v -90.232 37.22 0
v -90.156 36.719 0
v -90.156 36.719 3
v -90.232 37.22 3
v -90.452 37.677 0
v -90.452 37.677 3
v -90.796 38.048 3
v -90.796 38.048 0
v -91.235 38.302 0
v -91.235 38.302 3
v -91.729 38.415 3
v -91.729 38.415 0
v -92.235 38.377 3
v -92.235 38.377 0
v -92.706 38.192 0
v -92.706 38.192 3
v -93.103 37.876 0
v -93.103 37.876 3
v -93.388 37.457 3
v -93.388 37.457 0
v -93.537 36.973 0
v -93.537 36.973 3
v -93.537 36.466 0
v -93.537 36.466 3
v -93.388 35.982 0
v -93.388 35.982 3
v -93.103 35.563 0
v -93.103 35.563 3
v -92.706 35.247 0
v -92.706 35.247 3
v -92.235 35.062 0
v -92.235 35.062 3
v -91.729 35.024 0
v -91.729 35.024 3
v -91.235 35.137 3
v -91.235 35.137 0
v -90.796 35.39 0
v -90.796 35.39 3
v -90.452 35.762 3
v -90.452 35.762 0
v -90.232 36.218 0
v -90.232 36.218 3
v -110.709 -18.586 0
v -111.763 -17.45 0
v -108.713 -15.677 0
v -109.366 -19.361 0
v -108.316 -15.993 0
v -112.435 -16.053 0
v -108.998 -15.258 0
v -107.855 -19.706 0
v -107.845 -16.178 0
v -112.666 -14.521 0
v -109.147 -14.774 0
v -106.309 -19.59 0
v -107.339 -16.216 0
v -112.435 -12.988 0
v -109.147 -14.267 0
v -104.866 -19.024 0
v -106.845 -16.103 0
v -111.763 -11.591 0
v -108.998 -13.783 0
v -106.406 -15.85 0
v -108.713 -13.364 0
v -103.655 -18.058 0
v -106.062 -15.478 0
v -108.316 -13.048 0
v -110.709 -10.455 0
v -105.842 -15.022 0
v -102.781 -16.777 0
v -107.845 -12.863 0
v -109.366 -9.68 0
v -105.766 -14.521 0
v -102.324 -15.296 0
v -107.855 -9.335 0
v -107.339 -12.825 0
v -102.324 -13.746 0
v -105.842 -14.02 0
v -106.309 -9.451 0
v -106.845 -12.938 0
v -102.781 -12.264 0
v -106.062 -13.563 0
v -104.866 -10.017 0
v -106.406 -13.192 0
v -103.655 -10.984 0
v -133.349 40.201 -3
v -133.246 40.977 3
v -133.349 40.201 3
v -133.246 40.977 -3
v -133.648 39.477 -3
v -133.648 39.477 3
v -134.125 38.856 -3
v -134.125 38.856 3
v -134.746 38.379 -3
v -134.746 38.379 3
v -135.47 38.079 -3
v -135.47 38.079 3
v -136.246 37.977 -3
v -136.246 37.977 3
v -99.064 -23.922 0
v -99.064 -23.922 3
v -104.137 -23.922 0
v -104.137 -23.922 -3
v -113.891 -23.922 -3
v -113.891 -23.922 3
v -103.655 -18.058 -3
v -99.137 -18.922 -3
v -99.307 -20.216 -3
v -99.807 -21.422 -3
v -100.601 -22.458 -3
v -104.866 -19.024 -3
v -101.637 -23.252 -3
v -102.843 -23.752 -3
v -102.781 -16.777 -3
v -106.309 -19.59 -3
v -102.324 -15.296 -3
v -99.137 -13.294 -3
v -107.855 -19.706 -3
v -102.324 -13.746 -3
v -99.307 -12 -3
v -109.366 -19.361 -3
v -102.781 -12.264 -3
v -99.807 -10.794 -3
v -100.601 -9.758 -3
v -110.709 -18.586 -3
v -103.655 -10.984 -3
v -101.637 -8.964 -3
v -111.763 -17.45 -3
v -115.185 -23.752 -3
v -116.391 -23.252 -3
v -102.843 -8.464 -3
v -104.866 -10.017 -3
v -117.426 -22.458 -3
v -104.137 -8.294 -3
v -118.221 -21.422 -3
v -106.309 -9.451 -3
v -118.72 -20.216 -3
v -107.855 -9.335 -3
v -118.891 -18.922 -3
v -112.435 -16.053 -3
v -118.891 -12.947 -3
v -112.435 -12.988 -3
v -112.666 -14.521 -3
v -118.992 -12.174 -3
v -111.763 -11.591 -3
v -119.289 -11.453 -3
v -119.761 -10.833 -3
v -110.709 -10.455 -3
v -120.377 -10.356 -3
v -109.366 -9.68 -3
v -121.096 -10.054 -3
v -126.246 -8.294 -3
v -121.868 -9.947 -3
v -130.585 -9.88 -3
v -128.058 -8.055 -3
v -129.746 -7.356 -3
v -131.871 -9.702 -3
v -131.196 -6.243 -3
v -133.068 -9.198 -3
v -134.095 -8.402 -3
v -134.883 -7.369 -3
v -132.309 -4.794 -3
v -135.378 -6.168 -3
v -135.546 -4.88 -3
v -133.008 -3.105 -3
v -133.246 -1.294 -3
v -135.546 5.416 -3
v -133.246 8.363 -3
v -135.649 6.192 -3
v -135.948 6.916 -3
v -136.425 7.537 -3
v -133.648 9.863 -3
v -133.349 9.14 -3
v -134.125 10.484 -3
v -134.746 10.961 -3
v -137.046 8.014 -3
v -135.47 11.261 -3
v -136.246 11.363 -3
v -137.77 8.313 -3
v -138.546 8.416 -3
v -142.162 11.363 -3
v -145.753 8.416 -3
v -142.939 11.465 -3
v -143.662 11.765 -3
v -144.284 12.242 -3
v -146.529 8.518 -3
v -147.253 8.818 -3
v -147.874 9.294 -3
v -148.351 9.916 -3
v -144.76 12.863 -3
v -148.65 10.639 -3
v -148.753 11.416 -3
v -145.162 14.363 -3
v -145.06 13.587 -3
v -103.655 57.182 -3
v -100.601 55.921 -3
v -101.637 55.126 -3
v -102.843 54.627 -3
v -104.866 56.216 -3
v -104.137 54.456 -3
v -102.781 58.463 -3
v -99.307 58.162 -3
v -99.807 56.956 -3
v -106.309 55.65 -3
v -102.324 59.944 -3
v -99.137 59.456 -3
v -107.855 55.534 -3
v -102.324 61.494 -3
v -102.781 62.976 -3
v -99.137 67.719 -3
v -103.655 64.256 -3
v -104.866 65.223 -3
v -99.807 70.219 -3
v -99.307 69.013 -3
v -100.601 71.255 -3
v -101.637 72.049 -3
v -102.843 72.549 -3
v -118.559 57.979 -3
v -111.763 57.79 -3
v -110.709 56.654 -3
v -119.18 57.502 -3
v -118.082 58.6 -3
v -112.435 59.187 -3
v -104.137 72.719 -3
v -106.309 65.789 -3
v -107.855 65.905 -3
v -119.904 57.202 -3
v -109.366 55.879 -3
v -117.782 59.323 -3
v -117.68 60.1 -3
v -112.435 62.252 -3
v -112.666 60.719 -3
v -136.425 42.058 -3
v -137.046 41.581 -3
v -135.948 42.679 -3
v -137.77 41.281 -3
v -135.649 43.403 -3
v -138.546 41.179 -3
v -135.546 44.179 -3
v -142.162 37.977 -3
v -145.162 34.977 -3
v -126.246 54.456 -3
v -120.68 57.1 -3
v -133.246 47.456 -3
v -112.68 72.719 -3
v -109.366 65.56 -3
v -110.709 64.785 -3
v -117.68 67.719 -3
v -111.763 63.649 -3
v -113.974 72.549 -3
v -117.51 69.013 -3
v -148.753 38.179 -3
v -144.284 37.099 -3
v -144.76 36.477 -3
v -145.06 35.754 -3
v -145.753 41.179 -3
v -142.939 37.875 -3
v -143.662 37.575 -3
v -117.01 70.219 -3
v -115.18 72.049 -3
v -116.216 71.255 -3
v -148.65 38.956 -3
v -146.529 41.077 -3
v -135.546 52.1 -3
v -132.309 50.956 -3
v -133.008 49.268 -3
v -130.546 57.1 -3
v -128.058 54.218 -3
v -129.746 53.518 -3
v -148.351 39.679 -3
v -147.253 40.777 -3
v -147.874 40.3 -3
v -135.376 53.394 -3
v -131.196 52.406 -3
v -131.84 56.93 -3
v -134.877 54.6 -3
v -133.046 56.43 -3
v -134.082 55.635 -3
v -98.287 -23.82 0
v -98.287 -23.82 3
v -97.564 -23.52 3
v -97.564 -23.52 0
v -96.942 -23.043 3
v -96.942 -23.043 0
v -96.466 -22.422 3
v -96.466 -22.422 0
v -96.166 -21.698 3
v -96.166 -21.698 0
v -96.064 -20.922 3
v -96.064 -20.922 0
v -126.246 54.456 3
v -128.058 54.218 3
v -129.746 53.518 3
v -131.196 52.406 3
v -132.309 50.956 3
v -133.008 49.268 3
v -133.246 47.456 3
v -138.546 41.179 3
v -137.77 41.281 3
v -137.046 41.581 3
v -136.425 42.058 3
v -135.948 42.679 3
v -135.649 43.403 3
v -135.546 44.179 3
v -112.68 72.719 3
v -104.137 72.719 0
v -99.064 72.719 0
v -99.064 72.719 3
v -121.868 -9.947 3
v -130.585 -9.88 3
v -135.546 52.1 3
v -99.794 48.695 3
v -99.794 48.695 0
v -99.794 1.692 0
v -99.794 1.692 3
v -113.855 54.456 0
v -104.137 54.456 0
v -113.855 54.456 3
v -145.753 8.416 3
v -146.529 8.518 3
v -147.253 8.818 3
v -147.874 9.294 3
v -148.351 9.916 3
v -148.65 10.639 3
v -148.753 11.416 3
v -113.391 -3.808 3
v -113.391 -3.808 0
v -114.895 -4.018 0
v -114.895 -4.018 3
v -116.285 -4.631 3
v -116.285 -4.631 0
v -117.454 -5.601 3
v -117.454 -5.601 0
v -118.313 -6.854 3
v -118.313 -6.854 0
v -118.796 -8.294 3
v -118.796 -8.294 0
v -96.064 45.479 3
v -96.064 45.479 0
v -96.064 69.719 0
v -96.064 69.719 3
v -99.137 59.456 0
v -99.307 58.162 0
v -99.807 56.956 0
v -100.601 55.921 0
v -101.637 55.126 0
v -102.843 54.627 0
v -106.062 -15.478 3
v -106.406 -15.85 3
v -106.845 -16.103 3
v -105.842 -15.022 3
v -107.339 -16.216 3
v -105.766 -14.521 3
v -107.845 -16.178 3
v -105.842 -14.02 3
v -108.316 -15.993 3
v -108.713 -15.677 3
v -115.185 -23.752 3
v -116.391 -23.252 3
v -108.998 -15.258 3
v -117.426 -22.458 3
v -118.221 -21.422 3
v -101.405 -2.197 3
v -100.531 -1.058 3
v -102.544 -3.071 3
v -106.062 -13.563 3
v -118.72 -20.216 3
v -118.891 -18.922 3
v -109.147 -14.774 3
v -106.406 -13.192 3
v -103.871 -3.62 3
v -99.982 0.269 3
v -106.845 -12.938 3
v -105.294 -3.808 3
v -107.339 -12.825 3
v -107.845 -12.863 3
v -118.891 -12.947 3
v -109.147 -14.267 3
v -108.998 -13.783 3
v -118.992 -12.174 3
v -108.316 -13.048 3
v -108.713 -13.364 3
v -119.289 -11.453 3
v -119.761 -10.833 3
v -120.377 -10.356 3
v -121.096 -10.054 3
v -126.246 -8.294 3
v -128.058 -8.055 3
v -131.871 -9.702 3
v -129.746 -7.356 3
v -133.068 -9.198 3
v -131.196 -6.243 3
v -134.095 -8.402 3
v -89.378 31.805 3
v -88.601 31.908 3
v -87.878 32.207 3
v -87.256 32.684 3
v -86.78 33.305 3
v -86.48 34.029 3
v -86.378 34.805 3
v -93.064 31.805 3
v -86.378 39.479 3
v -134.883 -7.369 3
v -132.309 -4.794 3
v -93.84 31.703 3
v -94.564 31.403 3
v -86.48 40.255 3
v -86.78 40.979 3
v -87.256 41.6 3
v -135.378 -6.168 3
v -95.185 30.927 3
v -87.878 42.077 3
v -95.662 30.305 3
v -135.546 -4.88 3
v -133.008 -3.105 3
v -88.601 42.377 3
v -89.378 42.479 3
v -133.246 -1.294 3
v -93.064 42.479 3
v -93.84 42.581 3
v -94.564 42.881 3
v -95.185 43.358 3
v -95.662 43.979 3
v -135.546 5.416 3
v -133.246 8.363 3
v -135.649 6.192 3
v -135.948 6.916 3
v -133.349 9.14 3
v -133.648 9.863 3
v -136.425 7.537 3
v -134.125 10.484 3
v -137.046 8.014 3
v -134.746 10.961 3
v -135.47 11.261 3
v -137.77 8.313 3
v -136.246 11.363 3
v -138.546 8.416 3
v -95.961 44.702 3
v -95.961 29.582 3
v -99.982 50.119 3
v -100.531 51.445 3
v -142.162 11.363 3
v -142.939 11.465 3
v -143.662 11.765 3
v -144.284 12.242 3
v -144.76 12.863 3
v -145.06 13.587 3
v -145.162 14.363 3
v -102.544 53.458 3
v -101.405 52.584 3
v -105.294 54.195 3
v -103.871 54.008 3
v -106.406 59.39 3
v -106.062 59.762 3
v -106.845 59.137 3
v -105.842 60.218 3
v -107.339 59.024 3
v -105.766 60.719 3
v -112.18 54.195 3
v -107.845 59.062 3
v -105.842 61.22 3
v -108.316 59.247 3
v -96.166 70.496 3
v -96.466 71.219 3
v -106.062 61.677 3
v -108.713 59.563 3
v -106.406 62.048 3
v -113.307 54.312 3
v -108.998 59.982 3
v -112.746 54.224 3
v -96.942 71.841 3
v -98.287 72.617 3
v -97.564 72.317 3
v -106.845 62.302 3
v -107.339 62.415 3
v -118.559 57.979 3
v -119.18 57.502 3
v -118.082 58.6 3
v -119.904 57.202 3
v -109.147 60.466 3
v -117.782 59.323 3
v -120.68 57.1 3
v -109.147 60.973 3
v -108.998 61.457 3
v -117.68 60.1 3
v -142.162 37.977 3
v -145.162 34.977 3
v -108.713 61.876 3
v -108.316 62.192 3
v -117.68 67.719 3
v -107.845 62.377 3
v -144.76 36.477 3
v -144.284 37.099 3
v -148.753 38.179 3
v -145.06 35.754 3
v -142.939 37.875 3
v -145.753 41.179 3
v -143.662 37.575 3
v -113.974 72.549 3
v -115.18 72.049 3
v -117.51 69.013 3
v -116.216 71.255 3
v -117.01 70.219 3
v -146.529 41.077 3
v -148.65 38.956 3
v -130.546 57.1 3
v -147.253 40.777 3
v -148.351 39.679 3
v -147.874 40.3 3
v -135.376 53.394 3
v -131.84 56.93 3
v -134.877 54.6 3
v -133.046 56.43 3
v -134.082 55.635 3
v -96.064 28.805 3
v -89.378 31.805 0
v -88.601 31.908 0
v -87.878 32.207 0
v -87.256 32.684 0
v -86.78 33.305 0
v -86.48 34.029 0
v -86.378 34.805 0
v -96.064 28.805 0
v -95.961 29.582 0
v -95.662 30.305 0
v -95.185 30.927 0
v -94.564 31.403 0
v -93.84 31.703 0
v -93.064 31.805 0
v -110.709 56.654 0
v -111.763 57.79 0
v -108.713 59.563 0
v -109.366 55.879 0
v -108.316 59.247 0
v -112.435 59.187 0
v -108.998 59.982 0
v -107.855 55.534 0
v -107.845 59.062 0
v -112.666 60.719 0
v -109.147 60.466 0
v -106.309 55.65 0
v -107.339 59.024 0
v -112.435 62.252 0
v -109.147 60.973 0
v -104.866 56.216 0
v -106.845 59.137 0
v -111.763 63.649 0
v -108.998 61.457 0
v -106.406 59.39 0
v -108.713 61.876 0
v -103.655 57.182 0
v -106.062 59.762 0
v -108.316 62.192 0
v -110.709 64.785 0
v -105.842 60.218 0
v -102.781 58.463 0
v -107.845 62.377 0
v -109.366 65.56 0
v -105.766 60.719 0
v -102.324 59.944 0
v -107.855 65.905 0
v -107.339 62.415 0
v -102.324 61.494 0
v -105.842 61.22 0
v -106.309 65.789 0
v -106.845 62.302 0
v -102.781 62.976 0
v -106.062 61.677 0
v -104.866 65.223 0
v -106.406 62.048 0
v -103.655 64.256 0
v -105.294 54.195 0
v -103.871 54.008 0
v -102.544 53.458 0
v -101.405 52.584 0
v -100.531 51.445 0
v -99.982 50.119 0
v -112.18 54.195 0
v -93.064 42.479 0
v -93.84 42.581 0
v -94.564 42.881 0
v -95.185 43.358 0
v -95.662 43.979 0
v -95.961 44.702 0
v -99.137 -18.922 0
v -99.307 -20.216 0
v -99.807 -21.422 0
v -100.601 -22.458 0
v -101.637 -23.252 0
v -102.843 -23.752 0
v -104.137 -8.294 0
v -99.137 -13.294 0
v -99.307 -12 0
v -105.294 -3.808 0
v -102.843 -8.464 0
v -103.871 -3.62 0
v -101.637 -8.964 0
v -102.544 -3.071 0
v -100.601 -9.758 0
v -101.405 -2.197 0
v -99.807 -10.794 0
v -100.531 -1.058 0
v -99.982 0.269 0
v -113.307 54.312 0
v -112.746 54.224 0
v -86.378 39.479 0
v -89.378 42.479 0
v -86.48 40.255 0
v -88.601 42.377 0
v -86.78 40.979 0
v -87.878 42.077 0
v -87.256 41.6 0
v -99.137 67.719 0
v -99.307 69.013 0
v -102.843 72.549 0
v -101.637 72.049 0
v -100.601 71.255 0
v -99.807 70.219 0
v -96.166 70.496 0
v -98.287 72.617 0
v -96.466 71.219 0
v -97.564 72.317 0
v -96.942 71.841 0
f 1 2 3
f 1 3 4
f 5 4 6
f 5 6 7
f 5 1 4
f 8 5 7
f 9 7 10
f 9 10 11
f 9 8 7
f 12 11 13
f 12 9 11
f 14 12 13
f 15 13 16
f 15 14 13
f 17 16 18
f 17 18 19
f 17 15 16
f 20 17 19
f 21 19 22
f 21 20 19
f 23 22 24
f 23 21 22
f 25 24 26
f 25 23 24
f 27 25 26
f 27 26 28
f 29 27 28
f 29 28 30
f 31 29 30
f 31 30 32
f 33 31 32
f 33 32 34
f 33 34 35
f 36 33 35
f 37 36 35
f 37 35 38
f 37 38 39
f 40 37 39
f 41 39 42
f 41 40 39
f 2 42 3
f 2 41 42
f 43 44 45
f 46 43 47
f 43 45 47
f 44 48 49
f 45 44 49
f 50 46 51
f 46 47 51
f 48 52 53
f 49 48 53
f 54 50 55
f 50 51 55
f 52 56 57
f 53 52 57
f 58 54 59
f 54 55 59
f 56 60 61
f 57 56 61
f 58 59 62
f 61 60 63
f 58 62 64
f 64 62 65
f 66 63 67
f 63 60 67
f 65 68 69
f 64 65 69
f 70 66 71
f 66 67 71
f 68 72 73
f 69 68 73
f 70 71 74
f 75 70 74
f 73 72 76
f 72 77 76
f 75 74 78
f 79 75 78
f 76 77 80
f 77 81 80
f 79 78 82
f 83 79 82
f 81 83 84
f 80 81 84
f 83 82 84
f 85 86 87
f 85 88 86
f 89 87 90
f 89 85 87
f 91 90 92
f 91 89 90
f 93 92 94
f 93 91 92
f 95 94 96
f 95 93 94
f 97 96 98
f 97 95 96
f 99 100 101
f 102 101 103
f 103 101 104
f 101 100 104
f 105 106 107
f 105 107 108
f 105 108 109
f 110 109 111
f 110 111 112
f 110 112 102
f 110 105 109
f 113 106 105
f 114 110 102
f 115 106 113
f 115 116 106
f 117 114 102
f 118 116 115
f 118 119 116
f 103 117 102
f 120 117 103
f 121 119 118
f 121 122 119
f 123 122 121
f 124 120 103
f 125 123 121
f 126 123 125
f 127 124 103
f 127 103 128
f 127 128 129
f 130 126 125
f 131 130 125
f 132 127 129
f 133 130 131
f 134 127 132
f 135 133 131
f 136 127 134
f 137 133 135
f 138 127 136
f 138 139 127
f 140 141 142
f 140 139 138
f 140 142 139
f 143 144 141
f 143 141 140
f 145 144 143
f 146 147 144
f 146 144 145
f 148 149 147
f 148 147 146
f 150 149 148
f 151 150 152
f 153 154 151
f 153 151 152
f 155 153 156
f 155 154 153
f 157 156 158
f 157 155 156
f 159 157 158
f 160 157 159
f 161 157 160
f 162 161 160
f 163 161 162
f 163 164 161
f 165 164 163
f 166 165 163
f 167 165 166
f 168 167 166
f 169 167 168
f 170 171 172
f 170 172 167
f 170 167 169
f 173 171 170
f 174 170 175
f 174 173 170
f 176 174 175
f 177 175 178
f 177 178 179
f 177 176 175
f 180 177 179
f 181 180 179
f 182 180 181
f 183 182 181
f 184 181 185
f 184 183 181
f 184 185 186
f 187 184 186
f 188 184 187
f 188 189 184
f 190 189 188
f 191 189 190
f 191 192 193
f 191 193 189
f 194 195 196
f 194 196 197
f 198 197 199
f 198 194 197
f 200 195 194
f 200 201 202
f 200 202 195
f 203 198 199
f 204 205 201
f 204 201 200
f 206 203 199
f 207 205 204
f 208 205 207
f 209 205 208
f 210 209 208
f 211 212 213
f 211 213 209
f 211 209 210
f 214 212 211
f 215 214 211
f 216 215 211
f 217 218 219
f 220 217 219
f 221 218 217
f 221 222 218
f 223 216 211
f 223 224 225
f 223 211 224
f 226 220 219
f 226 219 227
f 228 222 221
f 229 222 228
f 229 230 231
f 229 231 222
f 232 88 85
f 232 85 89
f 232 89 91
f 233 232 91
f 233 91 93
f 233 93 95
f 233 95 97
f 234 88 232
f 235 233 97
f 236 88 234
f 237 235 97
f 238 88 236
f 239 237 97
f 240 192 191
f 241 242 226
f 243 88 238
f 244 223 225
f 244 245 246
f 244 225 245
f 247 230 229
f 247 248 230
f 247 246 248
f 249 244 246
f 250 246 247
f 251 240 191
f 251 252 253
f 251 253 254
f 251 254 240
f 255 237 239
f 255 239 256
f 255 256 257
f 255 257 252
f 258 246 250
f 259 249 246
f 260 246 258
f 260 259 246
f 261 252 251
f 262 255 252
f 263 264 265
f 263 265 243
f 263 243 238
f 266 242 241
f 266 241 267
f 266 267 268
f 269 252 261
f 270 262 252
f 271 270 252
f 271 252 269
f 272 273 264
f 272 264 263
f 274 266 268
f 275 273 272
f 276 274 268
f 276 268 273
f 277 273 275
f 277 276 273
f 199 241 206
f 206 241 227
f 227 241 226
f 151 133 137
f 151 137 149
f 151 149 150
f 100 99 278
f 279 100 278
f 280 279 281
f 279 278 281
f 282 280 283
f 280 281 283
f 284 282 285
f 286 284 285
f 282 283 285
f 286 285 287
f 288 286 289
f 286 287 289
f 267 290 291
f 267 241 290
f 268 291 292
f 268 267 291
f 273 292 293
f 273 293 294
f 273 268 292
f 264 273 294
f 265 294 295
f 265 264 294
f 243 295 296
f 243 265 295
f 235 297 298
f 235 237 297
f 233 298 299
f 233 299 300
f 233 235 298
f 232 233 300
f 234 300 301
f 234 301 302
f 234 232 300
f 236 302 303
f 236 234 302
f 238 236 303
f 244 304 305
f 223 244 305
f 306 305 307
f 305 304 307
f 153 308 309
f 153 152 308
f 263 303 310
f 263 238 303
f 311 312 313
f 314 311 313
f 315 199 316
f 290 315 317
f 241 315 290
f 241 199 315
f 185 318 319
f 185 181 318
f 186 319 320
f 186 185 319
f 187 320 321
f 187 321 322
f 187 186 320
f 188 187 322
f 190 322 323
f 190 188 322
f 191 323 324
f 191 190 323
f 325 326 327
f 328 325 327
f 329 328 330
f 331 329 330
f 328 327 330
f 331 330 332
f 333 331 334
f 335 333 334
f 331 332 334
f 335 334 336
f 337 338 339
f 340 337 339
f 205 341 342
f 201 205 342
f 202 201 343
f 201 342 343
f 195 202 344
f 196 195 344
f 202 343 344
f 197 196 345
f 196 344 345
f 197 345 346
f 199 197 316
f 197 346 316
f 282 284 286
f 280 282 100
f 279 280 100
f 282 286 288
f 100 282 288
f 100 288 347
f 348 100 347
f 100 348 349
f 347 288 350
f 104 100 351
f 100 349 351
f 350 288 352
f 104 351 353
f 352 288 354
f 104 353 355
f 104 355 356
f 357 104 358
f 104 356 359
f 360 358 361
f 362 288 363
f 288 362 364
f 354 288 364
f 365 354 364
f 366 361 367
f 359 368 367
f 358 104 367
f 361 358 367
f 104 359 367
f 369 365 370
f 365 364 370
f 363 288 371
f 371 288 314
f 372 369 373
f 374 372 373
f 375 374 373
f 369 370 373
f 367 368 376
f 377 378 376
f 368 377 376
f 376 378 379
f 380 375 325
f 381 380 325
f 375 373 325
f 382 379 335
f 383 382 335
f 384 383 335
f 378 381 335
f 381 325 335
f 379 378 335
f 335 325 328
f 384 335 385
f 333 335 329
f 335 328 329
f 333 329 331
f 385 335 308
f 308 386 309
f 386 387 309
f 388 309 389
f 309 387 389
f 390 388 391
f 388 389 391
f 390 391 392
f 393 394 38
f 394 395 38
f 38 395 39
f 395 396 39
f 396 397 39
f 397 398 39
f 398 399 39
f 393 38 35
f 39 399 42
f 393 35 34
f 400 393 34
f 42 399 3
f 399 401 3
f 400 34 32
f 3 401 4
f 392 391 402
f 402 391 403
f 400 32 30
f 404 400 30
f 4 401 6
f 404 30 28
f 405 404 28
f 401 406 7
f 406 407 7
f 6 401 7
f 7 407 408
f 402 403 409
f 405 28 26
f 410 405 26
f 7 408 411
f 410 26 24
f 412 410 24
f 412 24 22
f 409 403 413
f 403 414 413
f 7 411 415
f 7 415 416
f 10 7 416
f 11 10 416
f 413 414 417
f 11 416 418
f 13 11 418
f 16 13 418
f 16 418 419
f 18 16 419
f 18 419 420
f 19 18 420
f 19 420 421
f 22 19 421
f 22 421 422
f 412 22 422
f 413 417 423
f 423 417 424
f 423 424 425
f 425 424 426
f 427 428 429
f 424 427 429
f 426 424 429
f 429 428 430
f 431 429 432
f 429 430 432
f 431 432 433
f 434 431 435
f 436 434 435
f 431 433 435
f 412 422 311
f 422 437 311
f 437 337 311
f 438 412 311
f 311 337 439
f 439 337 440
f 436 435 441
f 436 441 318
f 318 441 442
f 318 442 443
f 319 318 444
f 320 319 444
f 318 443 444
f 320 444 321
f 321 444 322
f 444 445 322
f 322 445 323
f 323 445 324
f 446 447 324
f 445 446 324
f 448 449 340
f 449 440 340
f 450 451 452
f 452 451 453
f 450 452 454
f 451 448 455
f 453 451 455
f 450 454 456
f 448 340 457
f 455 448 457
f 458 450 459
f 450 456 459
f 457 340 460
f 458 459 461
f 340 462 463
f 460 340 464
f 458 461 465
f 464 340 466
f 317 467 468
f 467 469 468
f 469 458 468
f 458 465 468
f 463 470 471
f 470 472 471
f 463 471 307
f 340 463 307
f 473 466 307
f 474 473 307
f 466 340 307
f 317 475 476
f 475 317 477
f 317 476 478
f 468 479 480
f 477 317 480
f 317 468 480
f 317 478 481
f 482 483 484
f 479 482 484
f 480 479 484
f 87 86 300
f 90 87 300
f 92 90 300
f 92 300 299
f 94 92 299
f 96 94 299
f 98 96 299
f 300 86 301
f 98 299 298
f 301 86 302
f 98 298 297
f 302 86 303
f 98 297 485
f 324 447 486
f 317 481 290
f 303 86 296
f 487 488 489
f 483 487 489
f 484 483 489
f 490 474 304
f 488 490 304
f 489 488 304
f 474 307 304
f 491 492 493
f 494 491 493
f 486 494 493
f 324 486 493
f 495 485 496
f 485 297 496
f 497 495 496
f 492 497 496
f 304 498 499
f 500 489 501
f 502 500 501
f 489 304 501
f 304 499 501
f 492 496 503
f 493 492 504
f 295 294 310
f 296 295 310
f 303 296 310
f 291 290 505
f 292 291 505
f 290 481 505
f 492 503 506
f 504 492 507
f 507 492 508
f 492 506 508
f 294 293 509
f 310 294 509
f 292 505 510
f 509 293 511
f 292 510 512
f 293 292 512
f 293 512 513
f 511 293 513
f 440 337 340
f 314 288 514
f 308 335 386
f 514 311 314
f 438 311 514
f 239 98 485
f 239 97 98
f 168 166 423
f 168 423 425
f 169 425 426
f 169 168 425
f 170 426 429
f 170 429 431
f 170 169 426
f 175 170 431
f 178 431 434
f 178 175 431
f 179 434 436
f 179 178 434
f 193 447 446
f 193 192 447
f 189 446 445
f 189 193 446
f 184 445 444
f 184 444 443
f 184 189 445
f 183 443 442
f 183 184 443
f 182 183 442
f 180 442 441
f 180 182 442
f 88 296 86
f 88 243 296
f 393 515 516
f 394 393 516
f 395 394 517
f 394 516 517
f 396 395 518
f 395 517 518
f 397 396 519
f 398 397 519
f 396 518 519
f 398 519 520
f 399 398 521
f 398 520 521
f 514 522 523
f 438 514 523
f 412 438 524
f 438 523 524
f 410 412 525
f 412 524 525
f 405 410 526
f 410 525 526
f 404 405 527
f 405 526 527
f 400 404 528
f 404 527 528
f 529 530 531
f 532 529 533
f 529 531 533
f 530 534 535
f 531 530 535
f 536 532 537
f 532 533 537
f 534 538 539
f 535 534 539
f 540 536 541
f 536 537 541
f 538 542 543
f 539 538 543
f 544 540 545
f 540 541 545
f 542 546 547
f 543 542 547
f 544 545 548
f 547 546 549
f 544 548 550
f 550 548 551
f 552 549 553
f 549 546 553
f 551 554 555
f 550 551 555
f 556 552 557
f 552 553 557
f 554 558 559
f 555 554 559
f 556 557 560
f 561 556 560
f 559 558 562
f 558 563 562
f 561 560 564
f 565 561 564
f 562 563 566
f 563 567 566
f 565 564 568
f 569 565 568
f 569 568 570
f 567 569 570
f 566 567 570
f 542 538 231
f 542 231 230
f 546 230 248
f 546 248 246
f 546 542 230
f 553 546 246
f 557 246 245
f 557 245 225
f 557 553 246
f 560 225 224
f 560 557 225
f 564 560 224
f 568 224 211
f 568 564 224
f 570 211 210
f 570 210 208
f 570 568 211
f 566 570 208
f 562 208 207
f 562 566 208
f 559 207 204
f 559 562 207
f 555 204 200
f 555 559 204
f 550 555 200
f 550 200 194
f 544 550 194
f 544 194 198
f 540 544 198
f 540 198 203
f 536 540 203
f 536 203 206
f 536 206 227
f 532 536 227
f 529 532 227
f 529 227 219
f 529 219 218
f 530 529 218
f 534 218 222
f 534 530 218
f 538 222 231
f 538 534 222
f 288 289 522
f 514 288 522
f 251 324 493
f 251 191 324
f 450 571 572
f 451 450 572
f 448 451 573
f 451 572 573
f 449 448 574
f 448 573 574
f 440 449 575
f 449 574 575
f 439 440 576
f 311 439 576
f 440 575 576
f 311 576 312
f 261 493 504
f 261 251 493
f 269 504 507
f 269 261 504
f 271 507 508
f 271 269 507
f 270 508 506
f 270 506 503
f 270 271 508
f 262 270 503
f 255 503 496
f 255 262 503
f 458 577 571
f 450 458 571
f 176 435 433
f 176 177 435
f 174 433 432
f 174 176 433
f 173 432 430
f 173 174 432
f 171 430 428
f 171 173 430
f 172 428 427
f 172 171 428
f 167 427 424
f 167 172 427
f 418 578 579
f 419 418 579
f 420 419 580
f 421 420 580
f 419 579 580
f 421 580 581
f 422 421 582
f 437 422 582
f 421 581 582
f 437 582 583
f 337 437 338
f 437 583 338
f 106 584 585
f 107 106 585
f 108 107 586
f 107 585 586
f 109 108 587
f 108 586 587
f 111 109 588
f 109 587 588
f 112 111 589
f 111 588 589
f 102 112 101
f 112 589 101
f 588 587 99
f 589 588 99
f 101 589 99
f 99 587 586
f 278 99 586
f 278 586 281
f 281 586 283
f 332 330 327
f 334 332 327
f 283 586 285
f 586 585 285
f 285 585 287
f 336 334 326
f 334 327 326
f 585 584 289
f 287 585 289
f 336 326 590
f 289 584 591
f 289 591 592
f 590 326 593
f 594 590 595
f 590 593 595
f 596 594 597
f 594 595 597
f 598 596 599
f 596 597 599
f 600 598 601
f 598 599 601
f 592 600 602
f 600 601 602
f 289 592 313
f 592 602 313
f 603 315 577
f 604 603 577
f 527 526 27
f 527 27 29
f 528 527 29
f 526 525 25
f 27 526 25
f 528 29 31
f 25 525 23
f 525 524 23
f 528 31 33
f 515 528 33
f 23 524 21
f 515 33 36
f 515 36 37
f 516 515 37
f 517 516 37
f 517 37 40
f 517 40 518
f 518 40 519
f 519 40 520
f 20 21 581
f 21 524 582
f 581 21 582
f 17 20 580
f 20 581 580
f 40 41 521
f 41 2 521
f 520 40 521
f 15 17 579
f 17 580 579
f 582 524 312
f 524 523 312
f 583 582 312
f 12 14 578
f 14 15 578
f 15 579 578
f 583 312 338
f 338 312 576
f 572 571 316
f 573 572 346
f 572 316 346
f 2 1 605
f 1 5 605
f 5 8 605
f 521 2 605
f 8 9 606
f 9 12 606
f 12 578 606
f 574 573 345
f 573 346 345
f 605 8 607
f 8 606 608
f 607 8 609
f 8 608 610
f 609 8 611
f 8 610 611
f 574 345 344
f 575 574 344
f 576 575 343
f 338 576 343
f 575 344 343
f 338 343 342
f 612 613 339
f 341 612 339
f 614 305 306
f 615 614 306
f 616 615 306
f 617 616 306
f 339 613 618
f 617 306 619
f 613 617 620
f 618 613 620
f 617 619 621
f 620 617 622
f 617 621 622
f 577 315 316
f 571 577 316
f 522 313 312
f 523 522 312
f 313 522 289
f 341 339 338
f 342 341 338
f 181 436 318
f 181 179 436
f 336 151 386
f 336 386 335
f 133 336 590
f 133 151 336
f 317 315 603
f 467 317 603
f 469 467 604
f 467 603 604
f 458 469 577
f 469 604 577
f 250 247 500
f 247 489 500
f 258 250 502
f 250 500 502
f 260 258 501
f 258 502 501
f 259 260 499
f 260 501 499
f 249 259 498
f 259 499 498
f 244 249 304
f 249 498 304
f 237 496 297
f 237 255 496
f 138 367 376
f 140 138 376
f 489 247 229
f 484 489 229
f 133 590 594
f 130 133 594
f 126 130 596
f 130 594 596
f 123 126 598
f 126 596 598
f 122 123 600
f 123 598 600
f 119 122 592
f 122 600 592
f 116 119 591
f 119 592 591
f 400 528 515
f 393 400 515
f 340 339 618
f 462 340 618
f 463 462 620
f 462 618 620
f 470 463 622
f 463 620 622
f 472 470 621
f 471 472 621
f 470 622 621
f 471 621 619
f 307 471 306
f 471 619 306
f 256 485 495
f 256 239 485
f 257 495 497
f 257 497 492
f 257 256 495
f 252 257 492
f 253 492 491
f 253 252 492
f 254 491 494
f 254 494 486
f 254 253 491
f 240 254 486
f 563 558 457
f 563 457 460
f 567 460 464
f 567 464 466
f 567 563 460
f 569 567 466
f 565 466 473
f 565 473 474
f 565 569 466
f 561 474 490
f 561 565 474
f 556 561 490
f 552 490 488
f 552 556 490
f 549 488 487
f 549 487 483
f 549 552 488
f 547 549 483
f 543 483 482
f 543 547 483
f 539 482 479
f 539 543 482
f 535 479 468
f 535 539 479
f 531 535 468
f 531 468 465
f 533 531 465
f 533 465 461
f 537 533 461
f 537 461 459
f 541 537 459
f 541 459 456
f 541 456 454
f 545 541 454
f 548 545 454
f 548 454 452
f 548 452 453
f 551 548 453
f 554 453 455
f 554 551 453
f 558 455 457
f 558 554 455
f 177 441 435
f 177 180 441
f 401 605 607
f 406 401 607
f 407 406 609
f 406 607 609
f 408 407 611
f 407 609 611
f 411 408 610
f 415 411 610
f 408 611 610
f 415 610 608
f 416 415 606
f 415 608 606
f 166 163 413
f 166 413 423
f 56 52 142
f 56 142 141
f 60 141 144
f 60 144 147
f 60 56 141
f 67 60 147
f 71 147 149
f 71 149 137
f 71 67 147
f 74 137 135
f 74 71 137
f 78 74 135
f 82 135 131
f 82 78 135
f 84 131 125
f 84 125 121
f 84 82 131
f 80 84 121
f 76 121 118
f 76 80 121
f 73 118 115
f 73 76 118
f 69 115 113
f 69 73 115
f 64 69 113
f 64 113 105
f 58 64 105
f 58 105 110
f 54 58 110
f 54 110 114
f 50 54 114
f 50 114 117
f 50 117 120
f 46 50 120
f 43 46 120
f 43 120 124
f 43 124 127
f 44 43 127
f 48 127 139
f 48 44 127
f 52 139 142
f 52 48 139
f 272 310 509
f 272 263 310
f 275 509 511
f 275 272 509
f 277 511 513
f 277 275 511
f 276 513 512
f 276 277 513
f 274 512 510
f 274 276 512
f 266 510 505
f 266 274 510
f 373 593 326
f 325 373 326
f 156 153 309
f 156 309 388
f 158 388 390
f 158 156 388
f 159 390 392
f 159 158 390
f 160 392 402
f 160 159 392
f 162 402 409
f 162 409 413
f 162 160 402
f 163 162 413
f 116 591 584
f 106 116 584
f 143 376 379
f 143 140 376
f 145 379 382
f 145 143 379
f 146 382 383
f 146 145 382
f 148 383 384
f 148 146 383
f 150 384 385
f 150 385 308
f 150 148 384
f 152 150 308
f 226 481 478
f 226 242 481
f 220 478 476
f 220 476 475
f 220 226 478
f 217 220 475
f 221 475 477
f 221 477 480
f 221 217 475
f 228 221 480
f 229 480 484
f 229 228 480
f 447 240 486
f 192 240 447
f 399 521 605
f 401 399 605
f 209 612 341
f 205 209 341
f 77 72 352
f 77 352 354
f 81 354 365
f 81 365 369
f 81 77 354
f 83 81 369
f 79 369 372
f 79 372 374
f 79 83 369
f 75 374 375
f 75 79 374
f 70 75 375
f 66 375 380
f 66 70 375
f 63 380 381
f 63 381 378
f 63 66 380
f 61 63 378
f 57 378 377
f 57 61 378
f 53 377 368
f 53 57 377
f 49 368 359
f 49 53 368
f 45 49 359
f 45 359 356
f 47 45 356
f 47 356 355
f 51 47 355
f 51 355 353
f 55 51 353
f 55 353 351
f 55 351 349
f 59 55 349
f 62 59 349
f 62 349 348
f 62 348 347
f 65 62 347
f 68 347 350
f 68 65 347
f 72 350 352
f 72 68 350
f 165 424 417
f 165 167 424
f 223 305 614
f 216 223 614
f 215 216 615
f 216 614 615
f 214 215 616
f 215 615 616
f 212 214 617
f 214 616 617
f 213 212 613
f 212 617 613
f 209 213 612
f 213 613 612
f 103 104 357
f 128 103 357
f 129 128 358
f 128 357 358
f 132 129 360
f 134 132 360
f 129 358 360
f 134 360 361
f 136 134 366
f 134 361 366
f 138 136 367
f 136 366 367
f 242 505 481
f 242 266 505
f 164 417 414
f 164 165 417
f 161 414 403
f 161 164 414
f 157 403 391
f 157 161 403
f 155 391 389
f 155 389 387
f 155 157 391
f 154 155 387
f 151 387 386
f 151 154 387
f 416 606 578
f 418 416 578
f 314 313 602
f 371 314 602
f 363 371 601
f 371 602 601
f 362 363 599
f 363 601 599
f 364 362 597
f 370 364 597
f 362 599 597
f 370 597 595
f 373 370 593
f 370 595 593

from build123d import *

# Parameters (mm, degrees)
ESQUISSE1_R             = 1.7
BOSS_EXTRU_1_DEPTH      = 3
BOSS_EXTRU_2_DEPTH      = 3
BOSS_EXTRU_2_DEPTH_BACK = 3
ESQUISSE2_R             = 5.2


with BuildPart() as part:
    # Esquisse1 → Boss.-Extru.1 (new body)
    with BuildSketch(Plane.XY):
        with BuildLine():
            Line((-117.680084405, 66.939310237), (-117.680084405, 59.695120061))
            ThreePointArc((-117.680084405, 59.695120061), (-116.069171702, 55.806032765), (-112.180084405, 54.195120061))
            Line((-112.180084405, 54.195120061), (-105.294175096, 54.195120061))
            ThreePointArc((-105.294175096, 54.195120061), (-101.4050878, 52.584207358), (-99.794175096, 48.695120061))
            Line((-99.794175096, 48.695120061), (-99.794175096, 35.930823665))
            Line((-99.794175096, 35.930823665), (-99.794175096, 12.910007682))
            Line((-99.794175096, 12.910007682), (-99.794175096, 1.692208933))
            ThreePointArc((-99.794175096, 1.692208933), (-101.4050878, -2.196878364), (-105.294175096, -3.807791067))
            Line((-105.294175096, -3.807791067), (-113.390601299, -3.807791067))
            ThreePointArc((-113.390601299, -3.807791067), (-117.279688595, -5.418703771), (-118.890601299, -9.307791067))
            Line((-118.890601299, -9.307791067), (-118.890601299, -18.42196685))
            ThreePointArc((-118.890601299, -18.42196685), (-117.279688595, -22.311054147), (-113.390601299, -23.92196685))
            Line((-113.390601299, -23.92196685), (-99.794175096, -23.92196685))
            Line((-99.794175096, -23.92196685), (-99.063687308, -23.92196685))
            ThreePointArc((-99.063687308, -23.92196685), (-96.942366965, -23.043287194), (-96.063687308, -20.92196685))
            Line((-96.063687308, -20.92196685), (-96.063687308, 28.805298211))
            ThreePointArc((-96.063687308, 28.805298211), (-95.185007652, 30.926618554), (-93.063687308, 31.805298211))
            Line((-93.063687308, 31.805298211), (-89.37766128, 31.805298211))
            ThreePointArc((-89.37766128, 31.805298211), (-87.256340937, 32.683977867), (-86.37766128, 34.805298211))
            Line((-86.37766128, 34.805298211), (-86.37766128, 39.478876094))
            ThreePointArc((-86.37766128, 39.478876094), (-87.256340937, 41.600196437), (-89.37766128, 42.478876094))
            Line((-89.37766128, 42.478876094), (-93.063687308, 42.478876094))
            ThreePointArc((-93.063687308, 42.478876094), (-95.185007652, 43.35755575), (-96.063687308, 45.478876094))
            Line((-96.063687308, 45.478876094), (-96.063687308, 69.719310237))
            ThreePointArc((-96.063687308, 69.719310237), (-96.942366965, 71.840630581), (-99.063687308, 72.719310237))
            Line((-99.063687308, 72.719310237), (-112.180084405, 72.719310237))
            ThreePointArc((-112.180084405, 72.719310237), (-116.069171702, 71.108397534), (-117.680084405, 67.219310237))
            Line((-117.680084405, 67.219310237), (-117.680084405, 66.939310237))
        make_face()
        with Locations((-91.856378892, 36.719310237)):
            Circle(ESQUISSE1_R, mode=Mode.SUBTRACT)
        with Locations((-107.466378892, -14.520689763)):
            Circle(ESQUISSE1_R, mode=Mode.SUBTRACT)
        with Locations((-107.466378892, 60.719310237)):
            Circle(ESQUISSE1_R, mode=Mode.SUBTRACT)
    extrude(amount=BOSS_EXTRU_1_DEPTH)

    # Esquisse2 → Boss.-Extru.2 (add, two sides: drawn at the far end of the back side and taken through both)
    with BuildSketch(Plane(origin=(0, 0, 0), x_dir=(-1, 0, 0), z_dir=(0, 0, -1)).offset(-BOSS_EXTRU_2_DEPTH_BACK)):
        with BuildLine():
            Line((121.867659056, -9.94673926), (130.584615963, -9.880075131))
            ThreePointArc((130.584615963, -9.880075131), (134.095405897, -8.402210456), (135.546378892, -4.880221341))
            Line((135.546378892, -4.880221341), (135.546378892, 5.415623015))
            ThreePointArc((135.546378892, 5.415623015), (136.425058549, 7.536943358), (138.546378892, 8.415623015))
            Line((138.546378892, 8.415623015), (145.752654566, 8.415623015))
            ThreePointArc((145.752654566, 8.415623015), (147.87397491, 9.294302671), (148.752654566, 11.415623015))
            Line((148.752654566, 11.415623015), (148.752654566, 38.179170847))
            ThreePointArc((148.752654566, 38.179170847), (147.87397491, 40.300491191), (145.752654566, 41.179170847))
            Line((145.752654566, 41.179170847), (138.546378892, 41.179170847))
            ThreePointArc((138.546378892, 41.179170847), (136.425058549, 42.057850504), (135.546378892, 44.179170847))
            Line((135.546378892, 44.179170847), (135.546378892, 52.099902349))
            ThreePointArc((135.546378892, 52.099902349), (134.081912798, 55.635436255), (130.546378892, 57.099902349))
            Line((130.546378892, 57.099902349), (120.680084405, 57.099902349))
            ThreePointArc((120.680084405, 57.099902349), (118.558764062, 57.978582005), (117.680084405, 60.099902349))
            Line((117.680084405, 60.099902349), (117.680084405, 67.719310237))
            ThreePointArc((117.680084405, 67.719310237), (116.215618311, 71.254844143), (112.680084405, 72.719310237))
            Line((112.680084405, 72.719310237), (104.136677999, 72.719310237))
            ThreePointArc((104.136677999, 72.719310237), (100.601144093, 71.254844143), (99.136677999, 67.719310237))
            Line((99.136677999, 67.719310237), (99.136677999, 59.456292263))
            ThreePointArc((99.136677999, 59.456292263), (100.601144093, 55.920758357), (104.136677999, 54.456292263))
            Line((104.136677999, 54.456292263), (126.246378892, 54.456292263))
            ThreePointArc((126.246378892, 54.456292263), (131.196126361, 52.406039732), (133.246378892, 47.456292263))
            Line((133.246378892, 47.456292263), (133.246378892, 40.977229779))
            ThreePointArc((133.246378892, 40.977229779), (134.125058549, 38.855909436), (136.246378892, 37.977229779))
            Line((136.246378892, 37.977229779), (142.162261637, 37.977229779))
            ThreePointArc((142.162261637, 37.977229779), (144.28358198, 37.098550123), (145.162261637, 34.977229779))
            Line((145.162261637, 34.977229779), (145.162261637, 14.363062522))
            ThreePointArc((145.162261637, 14.363062522), (144.28358198, 12.241742179), (142.162261637, 11.363062522))
            Line((142.162261637, 11.363062522), (136.246378892, 11.363062522))
            ThreePointArc((136.246378892, 11.363062522), (134.125058549, 10.484382866), (133.246378892, 8.363062522))
            Line((133.246378892, 8.363062522), (133.246378892, -1.293707737))
            ThreePointArc((133.246378892, -1.293707737), (131.196126361, -6.243455205), (126.246378892, -8.293707737))
            Line((126.246378892, -8.293707737), (104.136677999, -8.293707737))
            ThreePointArc((104.136677999, -8.293707737), (100.601144093, -9.758173831), (99.136677999, -13.293707737))
            Line((99.136677999, -13.293707737), (99.136677999, -18.92196685))
            ThreePointArc((99.136677999, -18.92196685), (100.601144093, -22.457500756), (104.136677999, -23.92196685))
            Line((104.136677999, -23.92196685), (113.890601299, -23.92196685))
            ThreePointArc((113.890601299, -23.92196685), (117.426135205, -22.457500756), (118.890601299, -18.92196685))
            Line((118.890601299, -18.92196685), (118.890601299, -12.946651534))
            ThreePointArc((118.890601299, -12.946651534), (119.761185096, -10.833458065), (121.867659056, -9.94673926))
        make_face()
        with Locations((107.466378892, -14.520689763)):
            Circle(ESQUISSE2_R, mode=Mode.SUBTRACT)
        with Locations((107.466378892, 60.719310237)):
            Circle(ESQUISSE2_R, mode=Mode.SUBTRACT)
    extrude(amount=BOSS_EXTRU_2_DEPTH + BOSS_EXTRU_2_DEPTH_BACK)


solid = part.part
